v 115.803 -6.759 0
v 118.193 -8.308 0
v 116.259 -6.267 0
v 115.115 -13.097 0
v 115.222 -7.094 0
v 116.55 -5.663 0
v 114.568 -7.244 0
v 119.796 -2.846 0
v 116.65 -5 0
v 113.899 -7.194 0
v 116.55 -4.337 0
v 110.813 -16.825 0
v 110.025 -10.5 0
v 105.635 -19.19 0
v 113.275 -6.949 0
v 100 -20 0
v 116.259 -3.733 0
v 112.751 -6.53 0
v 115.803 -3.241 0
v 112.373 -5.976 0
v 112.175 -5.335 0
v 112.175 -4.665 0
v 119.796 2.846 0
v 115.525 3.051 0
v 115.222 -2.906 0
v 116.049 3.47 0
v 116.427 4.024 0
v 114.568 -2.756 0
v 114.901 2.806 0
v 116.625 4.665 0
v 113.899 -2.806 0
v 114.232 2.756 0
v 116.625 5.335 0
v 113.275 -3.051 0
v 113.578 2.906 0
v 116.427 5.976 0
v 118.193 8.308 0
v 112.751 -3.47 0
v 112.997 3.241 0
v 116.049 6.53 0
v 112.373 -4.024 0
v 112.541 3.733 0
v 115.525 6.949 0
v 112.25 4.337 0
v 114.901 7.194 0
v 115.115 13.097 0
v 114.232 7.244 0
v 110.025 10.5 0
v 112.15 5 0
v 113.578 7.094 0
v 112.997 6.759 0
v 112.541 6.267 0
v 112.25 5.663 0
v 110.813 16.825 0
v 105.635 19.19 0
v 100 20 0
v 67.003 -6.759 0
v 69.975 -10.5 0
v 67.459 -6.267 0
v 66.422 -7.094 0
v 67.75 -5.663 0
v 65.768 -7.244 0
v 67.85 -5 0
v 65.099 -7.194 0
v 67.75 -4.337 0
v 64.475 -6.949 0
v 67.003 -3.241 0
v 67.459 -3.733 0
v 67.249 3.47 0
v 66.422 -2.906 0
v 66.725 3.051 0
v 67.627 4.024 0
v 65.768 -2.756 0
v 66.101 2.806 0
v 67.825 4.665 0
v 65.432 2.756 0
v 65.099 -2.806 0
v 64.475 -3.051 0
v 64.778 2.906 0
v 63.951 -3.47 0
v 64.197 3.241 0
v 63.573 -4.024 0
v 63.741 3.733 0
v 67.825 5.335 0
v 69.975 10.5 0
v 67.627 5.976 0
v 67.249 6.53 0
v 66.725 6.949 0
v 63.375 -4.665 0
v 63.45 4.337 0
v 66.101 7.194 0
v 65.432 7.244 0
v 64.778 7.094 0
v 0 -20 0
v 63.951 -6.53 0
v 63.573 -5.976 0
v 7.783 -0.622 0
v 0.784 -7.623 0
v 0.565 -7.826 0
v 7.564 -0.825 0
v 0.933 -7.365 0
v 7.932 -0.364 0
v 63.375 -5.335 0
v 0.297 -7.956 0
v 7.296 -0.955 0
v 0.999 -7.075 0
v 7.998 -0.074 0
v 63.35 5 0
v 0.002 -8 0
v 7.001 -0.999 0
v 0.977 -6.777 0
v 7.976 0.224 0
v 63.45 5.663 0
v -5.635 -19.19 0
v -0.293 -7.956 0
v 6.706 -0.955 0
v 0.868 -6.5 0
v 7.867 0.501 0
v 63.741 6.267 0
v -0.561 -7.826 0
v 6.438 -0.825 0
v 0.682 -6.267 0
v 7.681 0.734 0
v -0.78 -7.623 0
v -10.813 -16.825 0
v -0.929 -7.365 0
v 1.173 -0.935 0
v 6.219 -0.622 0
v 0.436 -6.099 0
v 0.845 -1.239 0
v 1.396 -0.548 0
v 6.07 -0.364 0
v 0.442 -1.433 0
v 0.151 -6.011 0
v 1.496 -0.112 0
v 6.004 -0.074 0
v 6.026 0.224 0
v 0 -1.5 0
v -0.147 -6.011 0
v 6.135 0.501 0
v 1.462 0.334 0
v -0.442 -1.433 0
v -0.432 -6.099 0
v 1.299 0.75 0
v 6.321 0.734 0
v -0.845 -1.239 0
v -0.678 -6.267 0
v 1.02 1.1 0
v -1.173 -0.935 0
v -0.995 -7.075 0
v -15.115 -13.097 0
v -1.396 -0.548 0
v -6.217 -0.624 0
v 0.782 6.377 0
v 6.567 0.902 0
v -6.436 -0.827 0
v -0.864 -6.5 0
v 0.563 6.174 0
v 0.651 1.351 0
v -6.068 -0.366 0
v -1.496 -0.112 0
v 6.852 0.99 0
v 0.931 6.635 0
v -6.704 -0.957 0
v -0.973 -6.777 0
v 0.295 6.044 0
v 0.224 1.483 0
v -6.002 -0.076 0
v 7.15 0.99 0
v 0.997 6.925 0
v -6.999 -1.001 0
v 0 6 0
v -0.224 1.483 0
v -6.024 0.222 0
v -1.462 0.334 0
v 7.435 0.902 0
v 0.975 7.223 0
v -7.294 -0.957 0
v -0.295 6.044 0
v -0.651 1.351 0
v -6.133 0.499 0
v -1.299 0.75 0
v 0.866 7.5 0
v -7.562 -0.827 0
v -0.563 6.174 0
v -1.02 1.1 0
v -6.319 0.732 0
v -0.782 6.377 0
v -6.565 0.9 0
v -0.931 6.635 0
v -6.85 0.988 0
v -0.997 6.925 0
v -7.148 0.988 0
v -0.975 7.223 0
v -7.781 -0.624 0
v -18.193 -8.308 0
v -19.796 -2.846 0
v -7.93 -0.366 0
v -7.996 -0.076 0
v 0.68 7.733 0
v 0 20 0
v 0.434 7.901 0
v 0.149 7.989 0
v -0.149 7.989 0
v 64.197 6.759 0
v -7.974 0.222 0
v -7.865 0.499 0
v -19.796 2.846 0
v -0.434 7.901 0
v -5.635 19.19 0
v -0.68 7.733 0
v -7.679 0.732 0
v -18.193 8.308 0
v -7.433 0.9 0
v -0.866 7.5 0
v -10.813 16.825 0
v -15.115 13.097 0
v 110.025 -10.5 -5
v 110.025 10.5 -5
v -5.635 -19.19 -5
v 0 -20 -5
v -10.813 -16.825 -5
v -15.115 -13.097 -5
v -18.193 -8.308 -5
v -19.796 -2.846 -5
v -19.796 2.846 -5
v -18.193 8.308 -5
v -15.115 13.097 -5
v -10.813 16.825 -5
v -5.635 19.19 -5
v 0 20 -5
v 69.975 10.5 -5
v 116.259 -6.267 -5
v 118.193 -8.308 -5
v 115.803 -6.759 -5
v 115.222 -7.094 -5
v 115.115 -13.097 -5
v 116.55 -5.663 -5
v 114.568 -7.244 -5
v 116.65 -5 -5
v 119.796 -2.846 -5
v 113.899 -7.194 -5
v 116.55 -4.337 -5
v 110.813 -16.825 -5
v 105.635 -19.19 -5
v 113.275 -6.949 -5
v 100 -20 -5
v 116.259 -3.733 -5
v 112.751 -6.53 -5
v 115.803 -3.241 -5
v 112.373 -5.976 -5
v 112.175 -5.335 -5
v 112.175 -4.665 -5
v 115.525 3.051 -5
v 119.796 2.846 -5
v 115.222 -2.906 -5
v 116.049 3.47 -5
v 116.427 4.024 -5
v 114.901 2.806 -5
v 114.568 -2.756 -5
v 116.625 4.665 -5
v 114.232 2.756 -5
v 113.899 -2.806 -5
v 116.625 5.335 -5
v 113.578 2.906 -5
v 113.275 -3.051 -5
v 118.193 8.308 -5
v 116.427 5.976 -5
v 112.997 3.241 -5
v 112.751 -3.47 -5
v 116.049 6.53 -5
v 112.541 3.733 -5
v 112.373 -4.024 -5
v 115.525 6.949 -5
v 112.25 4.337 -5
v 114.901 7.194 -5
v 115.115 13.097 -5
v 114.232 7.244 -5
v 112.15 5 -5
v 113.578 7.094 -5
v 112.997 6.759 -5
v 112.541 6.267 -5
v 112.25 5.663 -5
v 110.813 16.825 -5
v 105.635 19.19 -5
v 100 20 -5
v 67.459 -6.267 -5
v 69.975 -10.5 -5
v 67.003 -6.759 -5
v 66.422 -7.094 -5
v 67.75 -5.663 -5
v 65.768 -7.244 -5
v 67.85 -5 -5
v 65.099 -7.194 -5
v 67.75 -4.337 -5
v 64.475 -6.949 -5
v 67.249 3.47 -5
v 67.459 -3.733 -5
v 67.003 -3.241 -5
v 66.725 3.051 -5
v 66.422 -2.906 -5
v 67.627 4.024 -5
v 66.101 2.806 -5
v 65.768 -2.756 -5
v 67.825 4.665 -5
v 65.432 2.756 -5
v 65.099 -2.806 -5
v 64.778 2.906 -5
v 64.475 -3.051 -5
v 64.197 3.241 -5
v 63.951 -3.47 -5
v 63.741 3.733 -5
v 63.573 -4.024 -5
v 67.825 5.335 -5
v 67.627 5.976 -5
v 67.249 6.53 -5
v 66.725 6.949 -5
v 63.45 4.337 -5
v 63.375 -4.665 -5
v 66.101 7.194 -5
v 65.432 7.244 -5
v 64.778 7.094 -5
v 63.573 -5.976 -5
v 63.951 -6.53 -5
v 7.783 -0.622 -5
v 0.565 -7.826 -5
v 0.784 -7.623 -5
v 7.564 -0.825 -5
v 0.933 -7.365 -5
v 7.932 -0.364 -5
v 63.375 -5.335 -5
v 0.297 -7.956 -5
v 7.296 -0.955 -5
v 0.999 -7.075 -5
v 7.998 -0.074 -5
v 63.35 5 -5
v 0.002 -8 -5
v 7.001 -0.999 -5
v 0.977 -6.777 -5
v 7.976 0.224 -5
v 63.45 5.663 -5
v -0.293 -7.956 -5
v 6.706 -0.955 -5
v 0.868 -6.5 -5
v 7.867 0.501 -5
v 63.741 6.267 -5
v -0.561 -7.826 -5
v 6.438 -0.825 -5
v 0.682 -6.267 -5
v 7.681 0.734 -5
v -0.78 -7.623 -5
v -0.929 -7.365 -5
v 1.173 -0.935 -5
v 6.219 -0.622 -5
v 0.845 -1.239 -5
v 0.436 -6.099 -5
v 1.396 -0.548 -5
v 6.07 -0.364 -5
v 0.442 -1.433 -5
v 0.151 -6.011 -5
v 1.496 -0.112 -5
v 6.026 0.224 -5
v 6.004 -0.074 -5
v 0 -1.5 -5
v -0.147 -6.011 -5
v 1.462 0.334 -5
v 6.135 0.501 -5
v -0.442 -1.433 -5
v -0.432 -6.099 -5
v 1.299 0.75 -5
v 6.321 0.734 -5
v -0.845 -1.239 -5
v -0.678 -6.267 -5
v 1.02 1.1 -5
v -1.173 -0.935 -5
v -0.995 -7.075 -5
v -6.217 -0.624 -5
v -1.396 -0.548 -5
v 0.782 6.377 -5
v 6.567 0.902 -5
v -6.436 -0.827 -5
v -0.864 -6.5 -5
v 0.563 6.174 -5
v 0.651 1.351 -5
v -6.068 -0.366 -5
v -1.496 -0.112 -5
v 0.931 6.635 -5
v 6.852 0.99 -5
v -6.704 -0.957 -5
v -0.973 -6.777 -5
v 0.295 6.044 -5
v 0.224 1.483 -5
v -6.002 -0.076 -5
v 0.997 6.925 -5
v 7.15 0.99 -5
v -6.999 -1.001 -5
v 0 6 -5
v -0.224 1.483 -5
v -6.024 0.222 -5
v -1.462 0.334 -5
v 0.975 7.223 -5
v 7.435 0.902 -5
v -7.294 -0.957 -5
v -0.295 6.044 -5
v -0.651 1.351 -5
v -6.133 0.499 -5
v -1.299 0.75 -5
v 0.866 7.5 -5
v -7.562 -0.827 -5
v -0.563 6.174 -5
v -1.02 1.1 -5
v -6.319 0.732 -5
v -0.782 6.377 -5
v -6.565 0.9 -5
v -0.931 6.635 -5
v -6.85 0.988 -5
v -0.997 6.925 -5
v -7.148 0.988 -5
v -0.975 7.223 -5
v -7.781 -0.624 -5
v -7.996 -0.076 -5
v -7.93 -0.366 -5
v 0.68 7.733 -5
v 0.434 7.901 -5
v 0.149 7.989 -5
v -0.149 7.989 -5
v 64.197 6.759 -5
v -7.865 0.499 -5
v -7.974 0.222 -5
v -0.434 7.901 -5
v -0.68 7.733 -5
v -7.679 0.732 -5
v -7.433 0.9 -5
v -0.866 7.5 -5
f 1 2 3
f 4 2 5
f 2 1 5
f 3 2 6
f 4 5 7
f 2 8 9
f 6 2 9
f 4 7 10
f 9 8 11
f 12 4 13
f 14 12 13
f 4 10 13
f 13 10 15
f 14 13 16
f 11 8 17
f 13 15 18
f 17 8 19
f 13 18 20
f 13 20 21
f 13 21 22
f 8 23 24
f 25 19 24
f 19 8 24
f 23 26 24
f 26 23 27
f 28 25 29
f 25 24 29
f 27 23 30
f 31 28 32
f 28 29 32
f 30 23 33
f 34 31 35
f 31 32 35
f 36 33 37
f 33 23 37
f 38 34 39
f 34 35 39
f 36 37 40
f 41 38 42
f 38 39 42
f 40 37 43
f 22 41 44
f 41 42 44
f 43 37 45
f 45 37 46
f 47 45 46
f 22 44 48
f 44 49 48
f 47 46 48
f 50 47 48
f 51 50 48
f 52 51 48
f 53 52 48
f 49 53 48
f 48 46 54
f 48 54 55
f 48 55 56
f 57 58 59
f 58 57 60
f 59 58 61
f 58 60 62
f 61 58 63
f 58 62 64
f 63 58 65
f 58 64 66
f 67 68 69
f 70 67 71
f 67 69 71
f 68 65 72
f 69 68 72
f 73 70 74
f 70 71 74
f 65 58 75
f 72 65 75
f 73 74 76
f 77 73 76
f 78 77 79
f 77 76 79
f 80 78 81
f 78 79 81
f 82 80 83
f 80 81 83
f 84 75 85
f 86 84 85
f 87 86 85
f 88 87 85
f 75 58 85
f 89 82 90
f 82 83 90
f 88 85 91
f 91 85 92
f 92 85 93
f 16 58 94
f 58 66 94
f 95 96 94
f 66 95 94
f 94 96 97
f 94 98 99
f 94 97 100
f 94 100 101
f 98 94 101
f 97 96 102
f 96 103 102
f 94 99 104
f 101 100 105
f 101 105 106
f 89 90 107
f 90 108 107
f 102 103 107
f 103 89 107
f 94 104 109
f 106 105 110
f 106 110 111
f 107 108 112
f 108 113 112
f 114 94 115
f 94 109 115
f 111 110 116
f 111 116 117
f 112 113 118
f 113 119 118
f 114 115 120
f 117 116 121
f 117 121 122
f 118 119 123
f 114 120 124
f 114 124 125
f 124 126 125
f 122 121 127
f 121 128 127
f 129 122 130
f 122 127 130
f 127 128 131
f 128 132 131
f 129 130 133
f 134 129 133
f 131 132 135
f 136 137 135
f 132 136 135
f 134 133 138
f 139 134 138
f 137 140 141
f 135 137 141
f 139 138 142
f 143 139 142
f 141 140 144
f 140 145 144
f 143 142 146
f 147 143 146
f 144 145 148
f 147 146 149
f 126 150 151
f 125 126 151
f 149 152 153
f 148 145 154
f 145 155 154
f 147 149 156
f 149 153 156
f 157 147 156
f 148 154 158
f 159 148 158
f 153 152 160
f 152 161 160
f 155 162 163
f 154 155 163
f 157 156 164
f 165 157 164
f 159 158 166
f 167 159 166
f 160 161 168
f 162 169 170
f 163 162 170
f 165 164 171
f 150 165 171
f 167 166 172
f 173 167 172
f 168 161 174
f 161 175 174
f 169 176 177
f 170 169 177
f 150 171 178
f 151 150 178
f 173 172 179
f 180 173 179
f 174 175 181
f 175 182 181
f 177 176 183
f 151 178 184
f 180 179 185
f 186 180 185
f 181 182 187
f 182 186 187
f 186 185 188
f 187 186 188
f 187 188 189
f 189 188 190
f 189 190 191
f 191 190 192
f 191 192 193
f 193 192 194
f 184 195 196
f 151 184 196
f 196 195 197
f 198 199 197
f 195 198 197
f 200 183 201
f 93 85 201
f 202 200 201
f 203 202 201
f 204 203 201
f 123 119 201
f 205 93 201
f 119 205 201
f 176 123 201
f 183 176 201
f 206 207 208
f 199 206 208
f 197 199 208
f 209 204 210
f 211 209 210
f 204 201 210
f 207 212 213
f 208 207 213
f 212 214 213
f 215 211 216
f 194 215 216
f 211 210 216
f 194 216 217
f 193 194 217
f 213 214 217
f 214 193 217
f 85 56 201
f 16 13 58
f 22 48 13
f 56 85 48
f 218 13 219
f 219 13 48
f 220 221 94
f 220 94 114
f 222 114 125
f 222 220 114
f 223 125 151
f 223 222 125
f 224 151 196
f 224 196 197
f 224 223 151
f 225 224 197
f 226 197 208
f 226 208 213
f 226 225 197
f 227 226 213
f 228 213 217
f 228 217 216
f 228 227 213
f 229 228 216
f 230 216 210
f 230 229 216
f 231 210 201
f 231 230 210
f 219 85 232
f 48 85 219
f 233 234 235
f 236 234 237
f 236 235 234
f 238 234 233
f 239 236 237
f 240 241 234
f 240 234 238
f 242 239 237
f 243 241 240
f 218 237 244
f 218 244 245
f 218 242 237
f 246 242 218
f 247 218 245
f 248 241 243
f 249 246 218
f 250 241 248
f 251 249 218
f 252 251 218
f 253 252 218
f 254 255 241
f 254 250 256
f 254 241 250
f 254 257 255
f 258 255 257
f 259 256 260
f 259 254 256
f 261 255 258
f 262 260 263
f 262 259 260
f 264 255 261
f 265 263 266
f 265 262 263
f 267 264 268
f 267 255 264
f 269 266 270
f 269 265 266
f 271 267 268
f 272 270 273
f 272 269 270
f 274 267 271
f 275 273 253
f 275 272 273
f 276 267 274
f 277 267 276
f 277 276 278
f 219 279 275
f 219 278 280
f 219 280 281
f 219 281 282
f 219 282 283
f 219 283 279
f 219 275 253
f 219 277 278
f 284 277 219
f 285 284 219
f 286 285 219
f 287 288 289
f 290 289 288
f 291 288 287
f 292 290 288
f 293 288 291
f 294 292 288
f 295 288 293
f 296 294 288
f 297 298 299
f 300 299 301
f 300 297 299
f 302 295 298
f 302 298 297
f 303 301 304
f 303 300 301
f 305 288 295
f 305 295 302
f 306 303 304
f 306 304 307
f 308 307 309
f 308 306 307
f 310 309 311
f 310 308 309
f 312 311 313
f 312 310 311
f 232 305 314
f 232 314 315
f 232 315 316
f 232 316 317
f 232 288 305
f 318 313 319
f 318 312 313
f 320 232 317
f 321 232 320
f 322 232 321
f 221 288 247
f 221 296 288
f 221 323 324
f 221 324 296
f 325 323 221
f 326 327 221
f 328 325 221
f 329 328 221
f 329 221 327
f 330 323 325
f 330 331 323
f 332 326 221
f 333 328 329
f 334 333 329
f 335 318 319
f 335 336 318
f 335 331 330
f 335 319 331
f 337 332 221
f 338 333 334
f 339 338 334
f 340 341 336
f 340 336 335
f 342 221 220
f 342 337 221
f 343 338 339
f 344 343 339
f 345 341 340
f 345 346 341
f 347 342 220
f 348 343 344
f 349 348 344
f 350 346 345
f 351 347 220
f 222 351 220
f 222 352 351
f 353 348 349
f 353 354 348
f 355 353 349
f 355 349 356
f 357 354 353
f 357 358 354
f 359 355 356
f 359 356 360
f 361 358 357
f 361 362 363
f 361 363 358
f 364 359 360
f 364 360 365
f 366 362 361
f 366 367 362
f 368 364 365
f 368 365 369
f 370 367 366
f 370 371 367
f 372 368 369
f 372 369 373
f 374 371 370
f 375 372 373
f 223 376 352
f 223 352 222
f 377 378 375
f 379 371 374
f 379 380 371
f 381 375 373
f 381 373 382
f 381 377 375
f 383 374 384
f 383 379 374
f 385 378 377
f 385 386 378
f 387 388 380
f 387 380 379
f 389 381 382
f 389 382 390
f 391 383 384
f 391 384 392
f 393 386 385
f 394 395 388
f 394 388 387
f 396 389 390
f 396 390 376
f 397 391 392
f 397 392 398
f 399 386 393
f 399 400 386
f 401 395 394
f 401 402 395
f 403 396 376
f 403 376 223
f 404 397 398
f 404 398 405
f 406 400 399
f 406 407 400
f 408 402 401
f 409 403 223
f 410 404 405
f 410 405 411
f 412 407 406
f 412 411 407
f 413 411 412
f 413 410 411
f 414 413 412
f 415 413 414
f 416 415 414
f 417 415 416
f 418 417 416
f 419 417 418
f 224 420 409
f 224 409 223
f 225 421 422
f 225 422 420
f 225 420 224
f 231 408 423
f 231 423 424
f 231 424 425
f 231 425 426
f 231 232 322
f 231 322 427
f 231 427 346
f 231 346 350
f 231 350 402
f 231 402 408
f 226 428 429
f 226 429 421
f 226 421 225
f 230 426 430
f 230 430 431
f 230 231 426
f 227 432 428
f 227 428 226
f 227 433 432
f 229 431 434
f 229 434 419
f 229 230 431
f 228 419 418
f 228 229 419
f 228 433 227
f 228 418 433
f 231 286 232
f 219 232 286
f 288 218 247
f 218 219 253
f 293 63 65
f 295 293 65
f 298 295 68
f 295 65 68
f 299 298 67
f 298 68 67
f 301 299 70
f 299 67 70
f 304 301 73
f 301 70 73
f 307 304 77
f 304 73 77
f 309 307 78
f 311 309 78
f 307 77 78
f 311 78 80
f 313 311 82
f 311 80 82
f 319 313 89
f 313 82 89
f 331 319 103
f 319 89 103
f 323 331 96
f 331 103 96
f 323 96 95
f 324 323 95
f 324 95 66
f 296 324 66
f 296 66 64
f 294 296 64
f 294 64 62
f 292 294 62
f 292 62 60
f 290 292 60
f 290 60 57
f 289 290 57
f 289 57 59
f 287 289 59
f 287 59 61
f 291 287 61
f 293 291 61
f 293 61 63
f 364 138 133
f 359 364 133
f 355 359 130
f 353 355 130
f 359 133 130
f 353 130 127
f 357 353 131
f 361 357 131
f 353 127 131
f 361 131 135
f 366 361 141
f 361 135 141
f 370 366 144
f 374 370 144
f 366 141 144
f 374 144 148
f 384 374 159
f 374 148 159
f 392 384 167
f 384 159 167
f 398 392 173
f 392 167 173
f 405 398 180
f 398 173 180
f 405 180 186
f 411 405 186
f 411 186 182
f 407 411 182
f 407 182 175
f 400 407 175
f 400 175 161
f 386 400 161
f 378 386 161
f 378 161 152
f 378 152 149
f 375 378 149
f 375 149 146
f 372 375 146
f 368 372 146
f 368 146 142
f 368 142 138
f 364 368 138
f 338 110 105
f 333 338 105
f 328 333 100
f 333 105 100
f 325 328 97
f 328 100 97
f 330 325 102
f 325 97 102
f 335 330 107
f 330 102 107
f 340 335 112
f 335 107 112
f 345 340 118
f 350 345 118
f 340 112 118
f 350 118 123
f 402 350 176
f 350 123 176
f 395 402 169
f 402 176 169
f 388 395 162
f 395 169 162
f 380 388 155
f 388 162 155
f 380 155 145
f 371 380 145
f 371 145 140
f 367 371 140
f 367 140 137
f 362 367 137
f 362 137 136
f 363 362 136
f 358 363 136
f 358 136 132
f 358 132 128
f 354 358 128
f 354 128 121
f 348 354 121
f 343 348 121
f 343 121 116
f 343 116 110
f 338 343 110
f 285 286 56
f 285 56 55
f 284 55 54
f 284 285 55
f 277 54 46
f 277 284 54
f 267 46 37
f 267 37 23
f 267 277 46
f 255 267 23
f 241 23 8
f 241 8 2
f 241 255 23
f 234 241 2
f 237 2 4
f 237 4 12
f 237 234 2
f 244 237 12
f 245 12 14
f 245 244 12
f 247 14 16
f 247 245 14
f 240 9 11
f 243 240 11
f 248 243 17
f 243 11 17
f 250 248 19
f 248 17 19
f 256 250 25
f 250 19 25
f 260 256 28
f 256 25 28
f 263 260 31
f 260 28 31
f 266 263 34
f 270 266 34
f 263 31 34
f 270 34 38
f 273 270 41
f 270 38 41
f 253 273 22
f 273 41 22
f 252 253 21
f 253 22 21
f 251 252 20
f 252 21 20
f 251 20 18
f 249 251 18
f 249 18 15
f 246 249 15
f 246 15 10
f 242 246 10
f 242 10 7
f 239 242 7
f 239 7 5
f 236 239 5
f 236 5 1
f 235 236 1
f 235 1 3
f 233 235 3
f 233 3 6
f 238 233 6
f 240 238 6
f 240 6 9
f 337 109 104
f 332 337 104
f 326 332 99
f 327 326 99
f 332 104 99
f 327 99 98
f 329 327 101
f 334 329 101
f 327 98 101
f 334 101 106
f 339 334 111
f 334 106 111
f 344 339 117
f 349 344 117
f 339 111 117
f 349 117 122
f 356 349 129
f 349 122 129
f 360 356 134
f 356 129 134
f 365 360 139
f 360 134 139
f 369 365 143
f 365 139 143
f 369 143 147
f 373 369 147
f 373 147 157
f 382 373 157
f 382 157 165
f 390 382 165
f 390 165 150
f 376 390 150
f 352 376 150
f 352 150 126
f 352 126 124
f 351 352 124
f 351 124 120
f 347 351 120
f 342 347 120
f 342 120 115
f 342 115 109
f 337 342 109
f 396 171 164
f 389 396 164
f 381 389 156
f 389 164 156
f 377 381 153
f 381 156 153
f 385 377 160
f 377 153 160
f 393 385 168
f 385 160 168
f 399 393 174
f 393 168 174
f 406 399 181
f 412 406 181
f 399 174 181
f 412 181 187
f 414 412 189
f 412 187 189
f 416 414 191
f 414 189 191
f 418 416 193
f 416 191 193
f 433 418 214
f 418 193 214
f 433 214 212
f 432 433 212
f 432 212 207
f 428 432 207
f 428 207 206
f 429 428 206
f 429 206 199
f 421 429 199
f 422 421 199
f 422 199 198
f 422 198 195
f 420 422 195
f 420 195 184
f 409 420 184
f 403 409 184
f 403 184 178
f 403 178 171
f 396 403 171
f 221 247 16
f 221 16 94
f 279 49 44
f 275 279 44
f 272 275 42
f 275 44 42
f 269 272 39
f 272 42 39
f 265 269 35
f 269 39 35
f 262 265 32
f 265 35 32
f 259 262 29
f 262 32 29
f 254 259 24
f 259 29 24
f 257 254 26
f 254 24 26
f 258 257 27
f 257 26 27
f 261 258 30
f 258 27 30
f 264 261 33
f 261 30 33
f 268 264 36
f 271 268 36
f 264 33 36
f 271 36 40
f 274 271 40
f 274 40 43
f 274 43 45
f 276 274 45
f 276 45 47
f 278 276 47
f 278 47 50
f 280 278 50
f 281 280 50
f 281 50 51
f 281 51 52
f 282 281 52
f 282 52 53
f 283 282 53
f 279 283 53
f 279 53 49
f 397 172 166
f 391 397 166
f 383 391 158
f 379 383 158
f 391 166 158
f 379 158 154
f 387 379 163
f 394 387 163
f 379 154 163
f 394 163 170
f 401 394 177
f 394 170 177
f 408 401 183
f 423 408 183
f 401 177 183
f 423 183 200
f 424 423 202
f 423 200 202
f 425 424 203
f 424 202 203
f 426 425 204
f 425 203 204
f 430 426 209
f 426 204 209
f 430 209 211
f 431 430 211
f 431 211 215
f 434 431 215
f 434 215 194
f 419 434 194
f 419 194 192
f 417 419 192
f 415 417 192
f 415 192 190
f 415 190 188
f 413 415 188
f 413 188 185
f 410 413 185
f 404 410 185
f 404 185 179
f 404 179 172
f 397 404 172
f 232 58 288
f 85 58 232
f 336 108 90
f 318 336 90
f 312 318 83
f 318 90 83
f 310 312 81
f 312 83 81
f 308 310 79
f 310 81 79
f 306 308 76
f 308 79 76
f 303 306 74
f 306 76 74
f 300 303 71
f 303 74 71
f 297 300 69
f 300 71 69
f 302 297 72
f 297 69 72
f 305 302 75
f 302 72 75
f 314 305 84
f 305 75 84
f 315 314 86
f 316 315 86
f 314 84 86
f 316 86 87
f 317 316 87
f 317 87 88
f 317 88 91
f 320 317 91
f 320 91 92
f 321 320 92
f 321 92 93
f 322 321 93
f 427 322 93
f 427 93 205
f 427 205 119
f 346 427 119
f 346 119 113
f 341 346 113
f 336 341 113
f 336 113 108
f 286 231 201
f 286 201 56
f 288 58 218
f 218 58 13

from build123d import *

# Parameters (mm, degrees)
BOSS_EXTRUDE1_DEPTH   = 5
CUT_EXTRUDE1_REACH    = 123.758
SKETCH2_R             = 1.5
SKETCH2_R_2           = 1
BODY_MOVE_COPY1_ANGLE = 90
SKETCH19_R            = 2.25
SKETCH19_W            = 40.05
SKETCH19_H            = 21
CUT_EXTRUDE9_DEPTH    = 122.757956619


with BuildPart() as part:
    # Sketch1 → Boss-Extrude1 (new body)
    with BuildSketch(Plane(origin=(0, 0, 0), x_dir=(1, 0, 0), z_dir=(0, 1, 0))):
        with BuildLine():
            Line((100, -20), (0, -20))
            ThreePointArc((0, -20), (-20, 0), (0, 20))
            Line((0, 20), (100, 20))
            ThreePointArc((100, 20), (120, 0), (100, -20))
        make_face()
    extrude(amount=BOSS_EXTRUDE1_DEPTH)

    # Sketch2 → Cut-Extrude1 (cut, up to next)
    with BuildSketch(Plane(origin=(0, 5, 0), x_dir=(1, 0, 0), z_dir=(0, 1, 0)), mode=Mode.PRIVATE) as cut_extrude1_sk1:
        with Locations(Location((0, 0, 0), (0, 0, 270))):
            Circle(SKETCH2_R)
    cut_extrude1_tool1 = extrude(cut_extrude1_sk1.sketch, amount=-CUT_EXTRUDE1_REACH, mode=Mode.PRIVATE) & part.part
    # Sketch2 → Cut-Extrude1 (cut, up to next)
    with BuildSketch(Plane(origin=(0, 5, 0), x_dir=(1, 0, 0), z_dir=(0, 1, 0)), mode=Mode.PRIVATE) as cut_extrude1_sk2:
        with Locations(Location((0, 7, 0), (0, 0, 270))):
            Circle(SKETCH2_R_2)
    cut_extrude1_tool2 = extrude(cut_extrude1_sk2.sketch, amount=-CUT_EXTRUDE1_REACH, mode=Mode.PRIVATE) & part.part
    # Sketch2 → Cut-Extrude1 (cut, up to next)
    with BuildSketch(Plane(origin=(0, 5, 0), x_dir=(1, 0, 0), z_dir=(0, 1, 0)), mode=Mode.PRIVATE) as cut_extrude1_sk3:
        with Locations(Location((7.001, 0.001, 0), (0, 0, 270))):
            Circle(SKETCH2_R_2)
    cut_extrude1_tool3 = extrude(cut_extrude1_sk3.sketch, amount=-CUT_EXTRUDE1_REACH, mode=Mode.PRIVATE) & part.part
    # Sketch2 → Cut-Extrude1 (cut, up to next)
    with BuildSketch(Plane(origin=(0, 5, 0), x_dir=(1, 0, 0), z_dir=(0, 1, 0)), mode=Mode.PRIVATE) as cut_extrude1_sk4:
        with Locations(Location((0.002, -7, 0), (0, 0, 270))):
            Circle(SKETCH2_R_2)
    cut_extrude1_tool4 = extrude(cut_extrude1_sk4.sketch, amount=-CUT_EXTRUDE1_REACH, mode=Mode.PRIVATE) & part.part
    # Sketch2 → Cut-Extrude1 (cut, up to next)
    with BuildSketch(Plane(origin=(0, 5, 0), x_dir=(1, 0, 0), z_dir=(0, 1, 0)), mode=Mode.PRIVATE) as cut_extrude1_sk5:
        with Locations(Location((-6.999, -0.001, 0), (0, 0, 270))):
            Circle(SKETCH2_R_2)
    cut_extrude1_tool5 = extrude(cut_extrude1_sk5.sketch, amount=-CUT_EXTRUDE1_REACH, mode=Mode.PRIVATE) & part.part
    add(cut_extrude1_tool1.solids().sort_by_distance((0, 5, 0))[0], mode=Mode.SUBTRACT)
    add(cut_extrude1_tool2.solids().sort_by_distance((0, 5, -7))[0], mode=Mode.SUBTRACT)
    add(cut_extrude1_tool3.solids().sort_by_distance((7.001, 5, -0.001))[0], mode=Mode.SUBTRACT)
    add(cut_extrude1_tool4.solids().sort_by_distance((0.002, 5, 7))[0], mode=Mode.SUBTRACT)
    add(cut_extrude1_tool5.solids().sort_by_distance((-6.999, 5, 0.001))[0], mode=Mode.SUBTRACT)


with BuildPart() as part_1:
    # Body-Move/Copy1: moved
    add(part.part.rotate(Axis((0, 0, 0), (1, 0, 0)), BODY_MOVE_COPY1_ANGLE))

    # Sketch19 → Cut-Extrude9 (cut, through all)
    with BuildSketch(Plane.XY.offset(5)):
        with Locations((114.4, -5)):
            Circle(SKETCH19_R)
        with Locations(Location((114.4, 5, 0), (0, 0, 180))):
            Circle(SKETCH19_R)
        with Locations(Location((65.6, 5, 0), (0, 0, 180))):
            Circle(SKETCH19_R)
        with Locations((65.6, -5)):
            Circle(SKETCH19_R)
        with Locations((90, 0)):
            Rectangle(SKETCH19_W, SKETCH19_H)
    extrude(amount=-CUT_EXTRUDE9_DEPTH, mode=Mode.SUBTRACT)


with BuildPart() as part_2:
    # Body-Move/Copy2: moved
    add(part_1.part.moved(Location((0, 0, -5))))


solid = part_2.part
